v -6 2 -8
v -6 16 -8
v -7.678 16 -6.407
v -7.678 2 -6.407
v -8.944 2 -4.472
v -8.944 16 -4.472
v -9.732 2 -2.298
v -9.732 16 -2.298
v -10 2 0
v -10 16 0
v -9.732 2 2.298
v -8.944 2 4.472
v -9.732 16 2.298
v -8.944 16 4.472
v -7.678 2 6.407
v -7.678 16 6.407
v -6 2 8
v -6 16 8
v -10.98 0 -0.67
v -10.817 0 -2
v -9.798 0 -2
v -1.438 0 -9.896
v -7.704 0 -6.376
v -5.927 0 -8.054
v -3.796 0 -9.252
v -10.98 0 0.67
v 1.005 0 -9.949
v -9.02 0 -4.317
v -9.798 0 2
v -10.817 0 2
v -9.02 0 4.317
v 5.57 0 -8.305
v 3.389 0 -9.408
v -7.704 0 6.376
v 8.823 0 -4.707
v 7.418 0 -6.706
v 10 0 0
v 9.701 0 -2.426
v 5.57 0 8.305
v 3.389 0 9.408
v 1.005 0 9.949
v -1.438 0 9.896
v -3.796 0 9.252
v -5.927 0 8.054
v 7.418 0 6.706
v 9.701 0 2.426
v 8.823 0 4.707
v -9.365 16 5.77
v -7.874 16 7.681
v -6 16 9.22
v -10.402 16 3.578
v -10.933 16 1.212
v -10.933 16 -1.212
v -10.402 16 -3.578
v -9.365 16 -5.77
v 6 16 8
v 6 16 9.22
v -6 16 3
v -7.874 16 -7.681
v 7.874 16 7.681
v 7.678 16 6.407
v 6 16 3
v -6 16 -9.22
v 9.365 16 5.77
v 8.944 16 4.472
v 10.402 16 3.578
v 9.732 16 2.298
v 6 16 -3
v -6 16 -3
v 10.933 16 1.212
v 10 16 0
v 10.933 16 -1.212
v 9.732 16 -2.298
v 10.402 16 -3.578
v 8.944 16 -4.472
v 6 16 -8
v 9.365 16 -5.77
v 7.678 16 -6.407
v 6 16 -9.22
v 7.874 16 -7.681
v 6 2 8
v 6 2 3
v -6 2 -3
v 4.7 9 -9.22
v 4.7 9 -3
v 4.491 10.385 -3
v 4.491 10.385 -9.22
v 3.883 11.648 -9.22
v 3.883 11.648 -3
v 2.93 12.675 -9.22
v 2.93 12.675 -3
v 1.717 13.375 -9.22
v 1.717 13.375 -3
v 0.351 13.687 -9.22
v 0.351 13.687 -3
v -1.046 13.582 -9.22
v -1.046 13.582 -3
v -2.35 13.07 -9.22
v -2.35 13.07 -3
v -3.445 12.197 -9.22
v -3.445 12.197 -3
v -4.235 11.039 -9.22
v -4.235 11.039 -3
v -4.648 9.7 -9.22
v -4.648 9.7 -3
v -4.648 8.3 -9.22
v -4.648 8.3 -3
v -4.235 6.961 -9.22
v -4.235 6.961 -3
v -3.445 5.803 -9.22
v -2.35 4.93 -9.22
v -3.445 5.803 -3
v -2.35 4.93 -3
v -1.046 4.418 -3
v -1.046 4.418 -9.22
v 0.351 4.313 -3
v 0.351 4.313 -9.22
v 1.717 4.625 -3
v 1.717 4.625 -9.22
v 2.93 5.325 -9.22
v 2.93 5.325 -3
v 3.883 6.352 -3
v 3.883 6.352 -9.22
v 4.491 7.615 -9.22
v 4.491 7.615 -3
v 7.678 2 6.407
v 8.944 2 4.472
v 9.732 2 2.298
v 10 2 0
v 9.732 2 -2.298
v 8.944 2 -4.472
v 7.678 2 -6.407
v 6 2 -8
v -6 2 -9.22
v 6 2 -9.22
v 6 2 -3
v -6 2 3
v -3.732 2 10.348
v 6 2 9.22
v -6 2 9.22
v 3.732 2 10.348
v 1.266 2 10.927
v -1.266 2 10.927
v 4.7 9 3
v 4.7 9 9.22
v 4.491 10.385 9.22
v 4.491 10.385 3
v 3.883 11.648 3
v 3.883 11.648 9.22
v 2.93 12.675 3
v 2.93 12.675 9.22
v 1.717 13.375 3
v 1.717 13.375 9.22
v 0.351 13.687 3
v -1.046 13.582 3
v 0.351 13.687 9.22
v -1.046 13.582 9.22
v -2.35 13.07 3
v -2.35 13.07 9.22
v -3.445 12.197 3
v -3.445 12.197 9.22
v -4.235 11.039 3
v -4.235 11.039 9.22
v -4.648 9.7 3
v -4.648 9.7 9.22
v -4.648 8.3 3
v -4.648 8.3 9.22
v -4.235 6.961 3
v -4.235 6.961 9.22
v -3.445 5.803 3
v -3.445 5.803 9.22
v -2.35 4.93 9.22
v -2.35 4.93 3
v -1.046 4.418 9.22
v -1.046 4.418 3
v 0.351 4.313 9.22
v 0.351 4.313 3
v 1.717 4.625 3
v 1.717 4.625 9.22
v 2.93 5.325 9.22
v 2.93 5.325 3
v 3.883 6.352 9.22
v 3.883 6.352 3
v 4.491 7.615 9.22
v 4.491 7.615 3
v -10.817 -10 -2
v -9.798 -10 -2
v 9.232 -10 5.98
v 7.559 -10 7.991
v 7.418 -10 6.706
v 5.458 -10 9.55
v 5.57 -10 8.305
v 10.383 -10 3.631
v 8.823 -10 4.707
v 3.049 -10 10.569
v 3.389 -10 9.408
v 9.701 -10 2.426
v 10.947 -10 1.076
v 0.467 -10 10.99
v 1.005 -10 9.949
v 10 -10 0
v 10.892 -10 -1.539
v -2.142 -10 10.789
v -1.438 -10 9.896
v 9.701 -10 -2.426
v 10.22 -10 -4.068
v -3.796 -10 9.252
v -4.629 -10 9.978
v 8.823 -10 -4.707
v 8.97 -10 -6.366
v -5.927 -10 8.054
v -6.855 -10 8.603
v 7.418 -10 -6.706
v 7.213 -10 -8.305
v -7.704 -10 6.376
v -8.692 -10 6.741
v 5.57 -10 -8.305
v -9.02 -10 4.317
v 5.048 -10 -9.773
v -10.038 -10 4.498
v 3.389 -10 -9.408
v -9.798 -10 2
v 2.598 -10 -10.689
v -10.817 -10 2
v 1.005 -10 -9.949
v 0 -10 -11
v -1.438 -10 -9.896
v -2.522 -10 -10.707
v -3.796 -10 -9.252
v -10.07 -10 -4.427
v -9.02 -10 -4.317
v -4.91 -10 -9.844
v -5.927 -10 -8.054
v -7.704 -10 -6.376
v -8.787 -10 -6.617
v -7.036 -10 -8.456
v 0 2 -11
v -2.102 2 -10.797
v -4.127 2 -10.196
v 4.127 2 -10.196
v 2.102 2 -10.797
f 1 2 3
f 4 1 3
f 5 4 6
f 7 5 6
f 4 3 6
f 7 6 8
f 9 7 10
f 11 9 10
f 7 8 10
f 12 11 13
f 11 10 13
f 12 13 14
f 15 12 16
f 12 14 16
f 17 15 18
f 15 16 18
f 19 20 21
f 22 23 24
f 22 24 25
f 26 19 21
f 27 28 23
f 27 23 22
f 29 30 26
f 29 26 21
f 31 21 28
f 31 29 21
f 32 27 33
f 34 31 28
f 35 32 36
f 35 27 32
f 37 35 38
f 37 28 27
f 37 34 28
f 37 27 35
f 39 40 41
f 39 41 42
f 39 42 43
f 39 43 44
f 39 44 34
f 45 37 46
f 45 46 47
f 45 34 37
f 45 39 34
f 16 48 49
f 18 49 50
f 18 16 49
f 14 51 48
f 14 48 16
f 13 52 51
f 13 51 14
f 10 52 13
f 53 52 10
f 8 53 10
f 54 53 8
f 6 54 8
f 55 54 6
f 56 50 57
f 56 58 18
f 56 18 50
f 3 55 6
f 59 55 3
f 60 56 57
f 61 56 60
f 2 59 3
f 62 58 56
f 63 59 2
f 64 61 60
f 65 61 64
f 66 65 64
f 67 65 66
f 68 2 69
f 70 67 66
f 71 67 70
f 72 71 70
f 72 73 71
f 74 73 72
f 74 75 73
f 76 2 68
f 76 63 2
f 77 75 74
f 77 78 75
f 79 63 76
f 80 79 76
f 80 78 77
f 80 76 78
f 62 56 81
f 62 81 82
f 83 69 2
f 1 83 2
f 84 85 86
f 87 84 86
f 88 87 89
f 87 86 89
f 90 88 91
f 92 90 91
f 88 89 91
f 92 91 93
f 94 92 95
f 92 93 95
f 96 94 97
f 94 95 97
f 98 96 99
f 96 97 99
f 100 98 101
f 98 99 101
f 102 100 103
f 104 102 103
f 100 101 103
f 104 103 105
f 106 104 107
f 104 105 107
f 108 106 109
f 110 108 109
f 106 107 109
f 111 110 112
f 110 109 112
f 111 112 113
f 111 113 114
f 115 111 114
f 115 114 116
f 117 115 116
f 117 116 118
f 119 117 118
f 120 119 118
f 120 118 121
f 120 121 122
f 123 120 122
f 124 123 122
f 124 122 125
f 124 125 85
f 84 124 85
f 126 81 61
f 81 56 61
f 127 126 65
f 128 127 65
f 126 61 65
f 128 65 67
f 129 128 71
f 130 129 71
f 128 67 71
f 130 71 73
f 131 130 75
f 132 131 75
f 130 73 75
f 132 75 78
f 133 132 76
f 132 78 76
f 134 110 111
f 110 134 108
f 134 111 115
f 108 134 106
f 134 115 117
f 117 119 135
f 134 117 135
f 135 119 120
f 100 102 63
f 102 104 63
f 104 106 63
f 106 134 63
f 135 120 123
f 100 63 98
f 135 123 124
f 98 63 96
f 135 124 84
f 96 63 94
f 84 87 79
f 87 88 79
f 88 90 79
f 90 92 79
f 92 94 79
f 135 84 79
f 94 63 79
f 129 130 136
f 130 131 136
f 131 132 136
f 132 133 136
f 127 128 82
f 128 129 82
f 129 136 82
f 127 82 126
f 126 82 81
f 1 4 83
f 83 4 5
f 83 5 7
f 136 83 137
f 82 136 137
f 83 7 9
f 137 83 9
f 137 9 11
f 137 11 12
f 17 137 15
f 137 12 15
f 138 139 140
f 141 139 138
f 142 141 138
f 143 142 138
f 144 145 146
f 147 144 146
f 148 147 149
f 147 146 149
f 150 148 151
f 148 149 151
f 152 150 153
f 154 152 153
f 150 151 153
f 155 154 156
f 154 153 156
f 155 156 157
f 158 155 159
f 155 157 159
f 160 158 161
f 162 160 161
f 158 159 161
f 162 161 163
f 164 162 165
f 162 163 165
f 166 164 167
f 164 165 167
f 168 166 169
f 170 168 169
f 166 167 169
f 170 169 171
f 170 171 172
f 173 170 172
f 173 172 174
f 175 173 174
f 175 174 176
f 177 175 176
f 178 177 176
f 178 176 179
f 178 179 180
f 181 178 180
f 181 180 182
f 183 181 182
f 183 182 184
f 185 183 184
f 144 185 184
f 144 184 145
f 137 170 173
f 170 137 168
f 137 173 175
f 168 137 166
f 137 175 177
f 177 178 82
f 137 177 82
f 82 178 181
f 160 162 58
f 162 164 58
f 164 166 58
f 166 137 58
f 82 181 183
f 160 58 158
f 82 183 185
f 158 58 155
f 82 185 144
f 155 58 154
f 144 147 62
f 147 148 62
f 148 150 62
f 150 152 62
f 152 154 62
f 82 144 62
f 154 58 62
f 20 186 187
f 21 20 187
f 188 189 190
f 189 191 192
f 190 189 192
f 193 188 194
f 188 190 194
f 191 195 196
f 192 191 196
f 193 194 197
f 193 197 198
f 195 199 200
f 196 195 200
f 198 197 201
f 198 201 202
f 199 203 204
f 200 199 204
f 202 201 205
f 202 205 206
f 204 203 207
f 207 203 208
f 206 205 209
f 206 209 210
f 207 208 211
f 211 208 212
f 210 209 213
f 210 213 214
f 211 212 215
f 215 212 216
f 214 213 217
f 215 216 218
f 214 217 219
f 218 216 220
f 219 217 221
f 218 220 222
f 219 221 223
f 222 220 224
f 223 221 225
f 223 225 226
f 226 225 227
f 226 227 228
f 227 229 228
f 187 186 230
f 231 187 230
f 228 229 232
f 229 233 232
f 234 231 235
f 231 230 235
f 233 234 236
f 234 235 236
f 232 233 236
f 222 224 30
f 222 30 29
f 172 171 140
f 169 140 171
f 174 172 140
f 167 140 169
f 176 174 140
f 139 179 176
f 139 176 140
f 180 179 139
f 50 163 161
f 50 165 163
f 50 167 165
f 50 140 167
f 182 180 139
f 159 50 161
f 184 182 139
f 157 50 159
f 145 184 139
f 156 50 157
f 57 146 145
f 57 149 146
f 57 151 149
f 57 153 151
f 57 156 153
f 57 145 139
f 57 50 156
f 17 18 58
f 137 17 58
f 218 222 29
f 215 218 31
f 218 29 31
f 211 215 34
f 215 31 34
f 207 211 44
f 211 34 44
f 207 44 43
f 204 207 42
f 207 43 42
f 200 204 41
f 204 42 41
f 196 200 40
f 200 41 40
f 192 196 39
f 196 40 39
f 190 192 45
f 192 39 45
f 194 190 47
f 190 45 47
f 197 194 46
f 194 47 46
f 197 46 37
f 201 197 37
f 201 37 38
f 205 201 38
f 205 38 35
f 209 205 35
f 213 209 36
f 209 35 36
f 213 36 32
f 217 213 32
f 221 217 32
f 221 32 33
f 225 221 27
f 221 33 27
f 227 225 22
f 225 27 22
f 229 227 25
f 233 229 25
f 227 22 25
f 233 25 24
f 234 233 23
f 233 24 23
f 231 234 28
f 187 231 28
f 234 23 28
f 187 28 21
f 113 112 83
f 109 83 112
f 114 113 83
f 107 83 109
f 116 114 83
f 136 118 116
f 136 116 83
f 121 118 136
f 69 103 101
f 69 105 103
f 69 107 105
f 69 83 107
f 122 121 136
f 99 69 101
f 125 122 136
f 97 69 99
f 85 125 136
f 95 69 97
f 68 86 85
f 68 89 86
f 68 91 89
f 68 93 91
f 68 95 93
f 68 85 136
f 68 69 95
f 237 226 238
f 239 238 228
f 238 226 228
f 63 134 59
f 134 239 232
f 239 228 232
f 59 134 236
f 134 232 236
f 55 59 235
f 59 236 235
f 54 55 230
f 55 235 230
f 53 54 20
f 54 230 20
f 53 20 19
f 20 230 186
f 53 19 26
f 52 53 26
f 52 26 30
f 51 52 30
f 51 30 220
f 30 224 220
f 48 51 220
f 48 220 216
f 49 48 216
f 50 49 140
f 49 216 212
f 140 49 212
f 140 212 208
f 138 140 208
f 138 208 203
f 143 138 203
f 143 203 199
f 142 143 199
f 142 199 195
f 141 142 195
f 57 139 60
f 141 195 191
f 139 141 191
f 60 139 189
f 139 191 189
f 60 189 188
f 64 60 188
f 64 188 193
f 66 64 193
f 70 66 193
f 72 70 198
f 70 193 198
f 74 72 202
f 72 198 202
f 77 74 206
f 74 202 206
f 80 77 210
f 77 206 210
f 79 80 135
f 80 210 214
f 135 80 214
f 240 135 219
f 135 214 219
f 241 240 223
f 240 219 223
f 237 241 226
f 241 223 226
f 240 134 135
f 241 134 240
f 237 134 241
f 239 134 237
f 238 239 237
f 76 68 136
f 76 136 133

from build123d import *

# Parameters (mm, degrees)
SKETCH2_W           = 3
SKETCH2_H           = 4
CUT_EXTRUDE2_DEPTH  = 10
SKETCH6_W           = 12
SKETCH6_H           = 14
CUT_EXTRUDE3_DEPTH  = 14
BOSS_EXTRUDE1_REACH = 32.299
SKETCH7_W           = 12
SKETCH7_H           = 6.219544457
CUT_EXTRUDE4_REACH  = 30.033
SKETCH8_R           = 4.7


with BuildPart() as part:
    # Sketch1 → Revolve1 (revolve)
    with BuildSketch(Plane.XY, mode=Mode.PRIVATE) as revolve1_sk:
        Polygon((0, 0), (0, 2), (-10, 2), (-10, 16), (-11, 16), (-11, -10), (-10, -10), (-10, 0), align=None)
    revolve(revolve1_sk.sketch.rotate(Axis((0, 0, 0), (0, 1, 0)), 270), axis=Axis((0, 0, 0), (0, 1, 0)))

    # Sketch2 → Cut-Extrude2 (cut)
    with BuildSketch(Plane.XZ.offset(10)):
        with Locations((-10, 0)):
            Rectangle(SKETCH2_W, SKETCH2_H)
    extrude(amount=-CUT_EXTRUDE2_DEPTH, mode=Mode.SUBTRACT)

    # Sketch6 → Cut-Extrude3 (cut)
    with BuildSketch(Plane(origin=(0, 16, 0), x_dir=(1, 0, 0), z_dir=(0, 1, 0))):
        with Locations((0, -10)):
            Rectangle(SKETCH6_W, SKETCH6_H)
        with Locations((0, 10)):
            Rectangle(SKETCH6_W, SKETCH6_H)
    extrude(amount=-CUT_EXTRUDE3_DEPTH, mode=Mode.SUBTRACT)

    # Sketch7 → Boss-Extrude1 (add, up to next)
    with BuildSketch(Plane(origin=(0, 16, 0), x_dir=(1, 0, 0), z_dir=(0, 1, 0)), mode=Mode.PRIVATE) as boss_extrude1_sk1:
        with Locations((0, 6.109772229)):
            Rectangle(SKETCH7_W, SKETCH7_H)
    boss_extrude1_tool1 = extrude(boss_extrude1_sk1.sketch, amount=-BOSS_EXTRUDE1_REACH, mode=Mode.PRIVATE) - part.part
    # Sketch7 → Boss-Extrude1 (add, up to next)
    with BuildSketch(Plane(origin=(0, 16, 0), x_dir=(1, 0, 0), z_dir=(0, 1, 0)), mode=Mode.PRIVATE) as boss_extrude1_sk2:
        with Locations((0, -6.109772229)):
            Rectangle(SKETCH7_W, SKETCH7_H)
    boss_extrude1_tool2 = extrude(boss_extrude1_sk2.sketch, amount=-BOSS_EXTRUDE1_REACH, mode=Mode.PRIVATE) - part.part
    add(boss_extrude1_tool1.solids().sort_by_distance((0, 16, -6.109772))[0])
    add(boss_extrude1_tool2.solids().sort_by_distance((0, 16, 6.109772))[0])

    # Cut-Extrude4: up to this face of the body (flat: up to its plane)
    cut_extrude4_end = Plane(part.part.faces().sort_by_distance((0, 9, -9.219544457))[0])
    # Sketch8 → Cut-Extrude4 (cut, up to the picked face)
    with BuildSketch(Plane.XY.offset(9.219544457), mode=Mode.PRIVATE) as cut_extrude4_sk1:
        with Locations((0, 9)):
            Circle(SKETCH8_R)
    cut_extrude4_tool1 = split(extrude(cut_extrude4_sk1.sketch, amount=-CUT_EXTRUDE4_REACH, mode=Mode.PRIVATE), bisect_by=cut_extrude4_end, keep=Keep.BOTH, mode=Mode.PRIVATE)
    add(cut_extrude4_tool1.solids().sort_by(Axis((0, 9, 9.219544), (0, 0, -1)))[0], mode=Mode.SUBTRACT)


solid = part.part
